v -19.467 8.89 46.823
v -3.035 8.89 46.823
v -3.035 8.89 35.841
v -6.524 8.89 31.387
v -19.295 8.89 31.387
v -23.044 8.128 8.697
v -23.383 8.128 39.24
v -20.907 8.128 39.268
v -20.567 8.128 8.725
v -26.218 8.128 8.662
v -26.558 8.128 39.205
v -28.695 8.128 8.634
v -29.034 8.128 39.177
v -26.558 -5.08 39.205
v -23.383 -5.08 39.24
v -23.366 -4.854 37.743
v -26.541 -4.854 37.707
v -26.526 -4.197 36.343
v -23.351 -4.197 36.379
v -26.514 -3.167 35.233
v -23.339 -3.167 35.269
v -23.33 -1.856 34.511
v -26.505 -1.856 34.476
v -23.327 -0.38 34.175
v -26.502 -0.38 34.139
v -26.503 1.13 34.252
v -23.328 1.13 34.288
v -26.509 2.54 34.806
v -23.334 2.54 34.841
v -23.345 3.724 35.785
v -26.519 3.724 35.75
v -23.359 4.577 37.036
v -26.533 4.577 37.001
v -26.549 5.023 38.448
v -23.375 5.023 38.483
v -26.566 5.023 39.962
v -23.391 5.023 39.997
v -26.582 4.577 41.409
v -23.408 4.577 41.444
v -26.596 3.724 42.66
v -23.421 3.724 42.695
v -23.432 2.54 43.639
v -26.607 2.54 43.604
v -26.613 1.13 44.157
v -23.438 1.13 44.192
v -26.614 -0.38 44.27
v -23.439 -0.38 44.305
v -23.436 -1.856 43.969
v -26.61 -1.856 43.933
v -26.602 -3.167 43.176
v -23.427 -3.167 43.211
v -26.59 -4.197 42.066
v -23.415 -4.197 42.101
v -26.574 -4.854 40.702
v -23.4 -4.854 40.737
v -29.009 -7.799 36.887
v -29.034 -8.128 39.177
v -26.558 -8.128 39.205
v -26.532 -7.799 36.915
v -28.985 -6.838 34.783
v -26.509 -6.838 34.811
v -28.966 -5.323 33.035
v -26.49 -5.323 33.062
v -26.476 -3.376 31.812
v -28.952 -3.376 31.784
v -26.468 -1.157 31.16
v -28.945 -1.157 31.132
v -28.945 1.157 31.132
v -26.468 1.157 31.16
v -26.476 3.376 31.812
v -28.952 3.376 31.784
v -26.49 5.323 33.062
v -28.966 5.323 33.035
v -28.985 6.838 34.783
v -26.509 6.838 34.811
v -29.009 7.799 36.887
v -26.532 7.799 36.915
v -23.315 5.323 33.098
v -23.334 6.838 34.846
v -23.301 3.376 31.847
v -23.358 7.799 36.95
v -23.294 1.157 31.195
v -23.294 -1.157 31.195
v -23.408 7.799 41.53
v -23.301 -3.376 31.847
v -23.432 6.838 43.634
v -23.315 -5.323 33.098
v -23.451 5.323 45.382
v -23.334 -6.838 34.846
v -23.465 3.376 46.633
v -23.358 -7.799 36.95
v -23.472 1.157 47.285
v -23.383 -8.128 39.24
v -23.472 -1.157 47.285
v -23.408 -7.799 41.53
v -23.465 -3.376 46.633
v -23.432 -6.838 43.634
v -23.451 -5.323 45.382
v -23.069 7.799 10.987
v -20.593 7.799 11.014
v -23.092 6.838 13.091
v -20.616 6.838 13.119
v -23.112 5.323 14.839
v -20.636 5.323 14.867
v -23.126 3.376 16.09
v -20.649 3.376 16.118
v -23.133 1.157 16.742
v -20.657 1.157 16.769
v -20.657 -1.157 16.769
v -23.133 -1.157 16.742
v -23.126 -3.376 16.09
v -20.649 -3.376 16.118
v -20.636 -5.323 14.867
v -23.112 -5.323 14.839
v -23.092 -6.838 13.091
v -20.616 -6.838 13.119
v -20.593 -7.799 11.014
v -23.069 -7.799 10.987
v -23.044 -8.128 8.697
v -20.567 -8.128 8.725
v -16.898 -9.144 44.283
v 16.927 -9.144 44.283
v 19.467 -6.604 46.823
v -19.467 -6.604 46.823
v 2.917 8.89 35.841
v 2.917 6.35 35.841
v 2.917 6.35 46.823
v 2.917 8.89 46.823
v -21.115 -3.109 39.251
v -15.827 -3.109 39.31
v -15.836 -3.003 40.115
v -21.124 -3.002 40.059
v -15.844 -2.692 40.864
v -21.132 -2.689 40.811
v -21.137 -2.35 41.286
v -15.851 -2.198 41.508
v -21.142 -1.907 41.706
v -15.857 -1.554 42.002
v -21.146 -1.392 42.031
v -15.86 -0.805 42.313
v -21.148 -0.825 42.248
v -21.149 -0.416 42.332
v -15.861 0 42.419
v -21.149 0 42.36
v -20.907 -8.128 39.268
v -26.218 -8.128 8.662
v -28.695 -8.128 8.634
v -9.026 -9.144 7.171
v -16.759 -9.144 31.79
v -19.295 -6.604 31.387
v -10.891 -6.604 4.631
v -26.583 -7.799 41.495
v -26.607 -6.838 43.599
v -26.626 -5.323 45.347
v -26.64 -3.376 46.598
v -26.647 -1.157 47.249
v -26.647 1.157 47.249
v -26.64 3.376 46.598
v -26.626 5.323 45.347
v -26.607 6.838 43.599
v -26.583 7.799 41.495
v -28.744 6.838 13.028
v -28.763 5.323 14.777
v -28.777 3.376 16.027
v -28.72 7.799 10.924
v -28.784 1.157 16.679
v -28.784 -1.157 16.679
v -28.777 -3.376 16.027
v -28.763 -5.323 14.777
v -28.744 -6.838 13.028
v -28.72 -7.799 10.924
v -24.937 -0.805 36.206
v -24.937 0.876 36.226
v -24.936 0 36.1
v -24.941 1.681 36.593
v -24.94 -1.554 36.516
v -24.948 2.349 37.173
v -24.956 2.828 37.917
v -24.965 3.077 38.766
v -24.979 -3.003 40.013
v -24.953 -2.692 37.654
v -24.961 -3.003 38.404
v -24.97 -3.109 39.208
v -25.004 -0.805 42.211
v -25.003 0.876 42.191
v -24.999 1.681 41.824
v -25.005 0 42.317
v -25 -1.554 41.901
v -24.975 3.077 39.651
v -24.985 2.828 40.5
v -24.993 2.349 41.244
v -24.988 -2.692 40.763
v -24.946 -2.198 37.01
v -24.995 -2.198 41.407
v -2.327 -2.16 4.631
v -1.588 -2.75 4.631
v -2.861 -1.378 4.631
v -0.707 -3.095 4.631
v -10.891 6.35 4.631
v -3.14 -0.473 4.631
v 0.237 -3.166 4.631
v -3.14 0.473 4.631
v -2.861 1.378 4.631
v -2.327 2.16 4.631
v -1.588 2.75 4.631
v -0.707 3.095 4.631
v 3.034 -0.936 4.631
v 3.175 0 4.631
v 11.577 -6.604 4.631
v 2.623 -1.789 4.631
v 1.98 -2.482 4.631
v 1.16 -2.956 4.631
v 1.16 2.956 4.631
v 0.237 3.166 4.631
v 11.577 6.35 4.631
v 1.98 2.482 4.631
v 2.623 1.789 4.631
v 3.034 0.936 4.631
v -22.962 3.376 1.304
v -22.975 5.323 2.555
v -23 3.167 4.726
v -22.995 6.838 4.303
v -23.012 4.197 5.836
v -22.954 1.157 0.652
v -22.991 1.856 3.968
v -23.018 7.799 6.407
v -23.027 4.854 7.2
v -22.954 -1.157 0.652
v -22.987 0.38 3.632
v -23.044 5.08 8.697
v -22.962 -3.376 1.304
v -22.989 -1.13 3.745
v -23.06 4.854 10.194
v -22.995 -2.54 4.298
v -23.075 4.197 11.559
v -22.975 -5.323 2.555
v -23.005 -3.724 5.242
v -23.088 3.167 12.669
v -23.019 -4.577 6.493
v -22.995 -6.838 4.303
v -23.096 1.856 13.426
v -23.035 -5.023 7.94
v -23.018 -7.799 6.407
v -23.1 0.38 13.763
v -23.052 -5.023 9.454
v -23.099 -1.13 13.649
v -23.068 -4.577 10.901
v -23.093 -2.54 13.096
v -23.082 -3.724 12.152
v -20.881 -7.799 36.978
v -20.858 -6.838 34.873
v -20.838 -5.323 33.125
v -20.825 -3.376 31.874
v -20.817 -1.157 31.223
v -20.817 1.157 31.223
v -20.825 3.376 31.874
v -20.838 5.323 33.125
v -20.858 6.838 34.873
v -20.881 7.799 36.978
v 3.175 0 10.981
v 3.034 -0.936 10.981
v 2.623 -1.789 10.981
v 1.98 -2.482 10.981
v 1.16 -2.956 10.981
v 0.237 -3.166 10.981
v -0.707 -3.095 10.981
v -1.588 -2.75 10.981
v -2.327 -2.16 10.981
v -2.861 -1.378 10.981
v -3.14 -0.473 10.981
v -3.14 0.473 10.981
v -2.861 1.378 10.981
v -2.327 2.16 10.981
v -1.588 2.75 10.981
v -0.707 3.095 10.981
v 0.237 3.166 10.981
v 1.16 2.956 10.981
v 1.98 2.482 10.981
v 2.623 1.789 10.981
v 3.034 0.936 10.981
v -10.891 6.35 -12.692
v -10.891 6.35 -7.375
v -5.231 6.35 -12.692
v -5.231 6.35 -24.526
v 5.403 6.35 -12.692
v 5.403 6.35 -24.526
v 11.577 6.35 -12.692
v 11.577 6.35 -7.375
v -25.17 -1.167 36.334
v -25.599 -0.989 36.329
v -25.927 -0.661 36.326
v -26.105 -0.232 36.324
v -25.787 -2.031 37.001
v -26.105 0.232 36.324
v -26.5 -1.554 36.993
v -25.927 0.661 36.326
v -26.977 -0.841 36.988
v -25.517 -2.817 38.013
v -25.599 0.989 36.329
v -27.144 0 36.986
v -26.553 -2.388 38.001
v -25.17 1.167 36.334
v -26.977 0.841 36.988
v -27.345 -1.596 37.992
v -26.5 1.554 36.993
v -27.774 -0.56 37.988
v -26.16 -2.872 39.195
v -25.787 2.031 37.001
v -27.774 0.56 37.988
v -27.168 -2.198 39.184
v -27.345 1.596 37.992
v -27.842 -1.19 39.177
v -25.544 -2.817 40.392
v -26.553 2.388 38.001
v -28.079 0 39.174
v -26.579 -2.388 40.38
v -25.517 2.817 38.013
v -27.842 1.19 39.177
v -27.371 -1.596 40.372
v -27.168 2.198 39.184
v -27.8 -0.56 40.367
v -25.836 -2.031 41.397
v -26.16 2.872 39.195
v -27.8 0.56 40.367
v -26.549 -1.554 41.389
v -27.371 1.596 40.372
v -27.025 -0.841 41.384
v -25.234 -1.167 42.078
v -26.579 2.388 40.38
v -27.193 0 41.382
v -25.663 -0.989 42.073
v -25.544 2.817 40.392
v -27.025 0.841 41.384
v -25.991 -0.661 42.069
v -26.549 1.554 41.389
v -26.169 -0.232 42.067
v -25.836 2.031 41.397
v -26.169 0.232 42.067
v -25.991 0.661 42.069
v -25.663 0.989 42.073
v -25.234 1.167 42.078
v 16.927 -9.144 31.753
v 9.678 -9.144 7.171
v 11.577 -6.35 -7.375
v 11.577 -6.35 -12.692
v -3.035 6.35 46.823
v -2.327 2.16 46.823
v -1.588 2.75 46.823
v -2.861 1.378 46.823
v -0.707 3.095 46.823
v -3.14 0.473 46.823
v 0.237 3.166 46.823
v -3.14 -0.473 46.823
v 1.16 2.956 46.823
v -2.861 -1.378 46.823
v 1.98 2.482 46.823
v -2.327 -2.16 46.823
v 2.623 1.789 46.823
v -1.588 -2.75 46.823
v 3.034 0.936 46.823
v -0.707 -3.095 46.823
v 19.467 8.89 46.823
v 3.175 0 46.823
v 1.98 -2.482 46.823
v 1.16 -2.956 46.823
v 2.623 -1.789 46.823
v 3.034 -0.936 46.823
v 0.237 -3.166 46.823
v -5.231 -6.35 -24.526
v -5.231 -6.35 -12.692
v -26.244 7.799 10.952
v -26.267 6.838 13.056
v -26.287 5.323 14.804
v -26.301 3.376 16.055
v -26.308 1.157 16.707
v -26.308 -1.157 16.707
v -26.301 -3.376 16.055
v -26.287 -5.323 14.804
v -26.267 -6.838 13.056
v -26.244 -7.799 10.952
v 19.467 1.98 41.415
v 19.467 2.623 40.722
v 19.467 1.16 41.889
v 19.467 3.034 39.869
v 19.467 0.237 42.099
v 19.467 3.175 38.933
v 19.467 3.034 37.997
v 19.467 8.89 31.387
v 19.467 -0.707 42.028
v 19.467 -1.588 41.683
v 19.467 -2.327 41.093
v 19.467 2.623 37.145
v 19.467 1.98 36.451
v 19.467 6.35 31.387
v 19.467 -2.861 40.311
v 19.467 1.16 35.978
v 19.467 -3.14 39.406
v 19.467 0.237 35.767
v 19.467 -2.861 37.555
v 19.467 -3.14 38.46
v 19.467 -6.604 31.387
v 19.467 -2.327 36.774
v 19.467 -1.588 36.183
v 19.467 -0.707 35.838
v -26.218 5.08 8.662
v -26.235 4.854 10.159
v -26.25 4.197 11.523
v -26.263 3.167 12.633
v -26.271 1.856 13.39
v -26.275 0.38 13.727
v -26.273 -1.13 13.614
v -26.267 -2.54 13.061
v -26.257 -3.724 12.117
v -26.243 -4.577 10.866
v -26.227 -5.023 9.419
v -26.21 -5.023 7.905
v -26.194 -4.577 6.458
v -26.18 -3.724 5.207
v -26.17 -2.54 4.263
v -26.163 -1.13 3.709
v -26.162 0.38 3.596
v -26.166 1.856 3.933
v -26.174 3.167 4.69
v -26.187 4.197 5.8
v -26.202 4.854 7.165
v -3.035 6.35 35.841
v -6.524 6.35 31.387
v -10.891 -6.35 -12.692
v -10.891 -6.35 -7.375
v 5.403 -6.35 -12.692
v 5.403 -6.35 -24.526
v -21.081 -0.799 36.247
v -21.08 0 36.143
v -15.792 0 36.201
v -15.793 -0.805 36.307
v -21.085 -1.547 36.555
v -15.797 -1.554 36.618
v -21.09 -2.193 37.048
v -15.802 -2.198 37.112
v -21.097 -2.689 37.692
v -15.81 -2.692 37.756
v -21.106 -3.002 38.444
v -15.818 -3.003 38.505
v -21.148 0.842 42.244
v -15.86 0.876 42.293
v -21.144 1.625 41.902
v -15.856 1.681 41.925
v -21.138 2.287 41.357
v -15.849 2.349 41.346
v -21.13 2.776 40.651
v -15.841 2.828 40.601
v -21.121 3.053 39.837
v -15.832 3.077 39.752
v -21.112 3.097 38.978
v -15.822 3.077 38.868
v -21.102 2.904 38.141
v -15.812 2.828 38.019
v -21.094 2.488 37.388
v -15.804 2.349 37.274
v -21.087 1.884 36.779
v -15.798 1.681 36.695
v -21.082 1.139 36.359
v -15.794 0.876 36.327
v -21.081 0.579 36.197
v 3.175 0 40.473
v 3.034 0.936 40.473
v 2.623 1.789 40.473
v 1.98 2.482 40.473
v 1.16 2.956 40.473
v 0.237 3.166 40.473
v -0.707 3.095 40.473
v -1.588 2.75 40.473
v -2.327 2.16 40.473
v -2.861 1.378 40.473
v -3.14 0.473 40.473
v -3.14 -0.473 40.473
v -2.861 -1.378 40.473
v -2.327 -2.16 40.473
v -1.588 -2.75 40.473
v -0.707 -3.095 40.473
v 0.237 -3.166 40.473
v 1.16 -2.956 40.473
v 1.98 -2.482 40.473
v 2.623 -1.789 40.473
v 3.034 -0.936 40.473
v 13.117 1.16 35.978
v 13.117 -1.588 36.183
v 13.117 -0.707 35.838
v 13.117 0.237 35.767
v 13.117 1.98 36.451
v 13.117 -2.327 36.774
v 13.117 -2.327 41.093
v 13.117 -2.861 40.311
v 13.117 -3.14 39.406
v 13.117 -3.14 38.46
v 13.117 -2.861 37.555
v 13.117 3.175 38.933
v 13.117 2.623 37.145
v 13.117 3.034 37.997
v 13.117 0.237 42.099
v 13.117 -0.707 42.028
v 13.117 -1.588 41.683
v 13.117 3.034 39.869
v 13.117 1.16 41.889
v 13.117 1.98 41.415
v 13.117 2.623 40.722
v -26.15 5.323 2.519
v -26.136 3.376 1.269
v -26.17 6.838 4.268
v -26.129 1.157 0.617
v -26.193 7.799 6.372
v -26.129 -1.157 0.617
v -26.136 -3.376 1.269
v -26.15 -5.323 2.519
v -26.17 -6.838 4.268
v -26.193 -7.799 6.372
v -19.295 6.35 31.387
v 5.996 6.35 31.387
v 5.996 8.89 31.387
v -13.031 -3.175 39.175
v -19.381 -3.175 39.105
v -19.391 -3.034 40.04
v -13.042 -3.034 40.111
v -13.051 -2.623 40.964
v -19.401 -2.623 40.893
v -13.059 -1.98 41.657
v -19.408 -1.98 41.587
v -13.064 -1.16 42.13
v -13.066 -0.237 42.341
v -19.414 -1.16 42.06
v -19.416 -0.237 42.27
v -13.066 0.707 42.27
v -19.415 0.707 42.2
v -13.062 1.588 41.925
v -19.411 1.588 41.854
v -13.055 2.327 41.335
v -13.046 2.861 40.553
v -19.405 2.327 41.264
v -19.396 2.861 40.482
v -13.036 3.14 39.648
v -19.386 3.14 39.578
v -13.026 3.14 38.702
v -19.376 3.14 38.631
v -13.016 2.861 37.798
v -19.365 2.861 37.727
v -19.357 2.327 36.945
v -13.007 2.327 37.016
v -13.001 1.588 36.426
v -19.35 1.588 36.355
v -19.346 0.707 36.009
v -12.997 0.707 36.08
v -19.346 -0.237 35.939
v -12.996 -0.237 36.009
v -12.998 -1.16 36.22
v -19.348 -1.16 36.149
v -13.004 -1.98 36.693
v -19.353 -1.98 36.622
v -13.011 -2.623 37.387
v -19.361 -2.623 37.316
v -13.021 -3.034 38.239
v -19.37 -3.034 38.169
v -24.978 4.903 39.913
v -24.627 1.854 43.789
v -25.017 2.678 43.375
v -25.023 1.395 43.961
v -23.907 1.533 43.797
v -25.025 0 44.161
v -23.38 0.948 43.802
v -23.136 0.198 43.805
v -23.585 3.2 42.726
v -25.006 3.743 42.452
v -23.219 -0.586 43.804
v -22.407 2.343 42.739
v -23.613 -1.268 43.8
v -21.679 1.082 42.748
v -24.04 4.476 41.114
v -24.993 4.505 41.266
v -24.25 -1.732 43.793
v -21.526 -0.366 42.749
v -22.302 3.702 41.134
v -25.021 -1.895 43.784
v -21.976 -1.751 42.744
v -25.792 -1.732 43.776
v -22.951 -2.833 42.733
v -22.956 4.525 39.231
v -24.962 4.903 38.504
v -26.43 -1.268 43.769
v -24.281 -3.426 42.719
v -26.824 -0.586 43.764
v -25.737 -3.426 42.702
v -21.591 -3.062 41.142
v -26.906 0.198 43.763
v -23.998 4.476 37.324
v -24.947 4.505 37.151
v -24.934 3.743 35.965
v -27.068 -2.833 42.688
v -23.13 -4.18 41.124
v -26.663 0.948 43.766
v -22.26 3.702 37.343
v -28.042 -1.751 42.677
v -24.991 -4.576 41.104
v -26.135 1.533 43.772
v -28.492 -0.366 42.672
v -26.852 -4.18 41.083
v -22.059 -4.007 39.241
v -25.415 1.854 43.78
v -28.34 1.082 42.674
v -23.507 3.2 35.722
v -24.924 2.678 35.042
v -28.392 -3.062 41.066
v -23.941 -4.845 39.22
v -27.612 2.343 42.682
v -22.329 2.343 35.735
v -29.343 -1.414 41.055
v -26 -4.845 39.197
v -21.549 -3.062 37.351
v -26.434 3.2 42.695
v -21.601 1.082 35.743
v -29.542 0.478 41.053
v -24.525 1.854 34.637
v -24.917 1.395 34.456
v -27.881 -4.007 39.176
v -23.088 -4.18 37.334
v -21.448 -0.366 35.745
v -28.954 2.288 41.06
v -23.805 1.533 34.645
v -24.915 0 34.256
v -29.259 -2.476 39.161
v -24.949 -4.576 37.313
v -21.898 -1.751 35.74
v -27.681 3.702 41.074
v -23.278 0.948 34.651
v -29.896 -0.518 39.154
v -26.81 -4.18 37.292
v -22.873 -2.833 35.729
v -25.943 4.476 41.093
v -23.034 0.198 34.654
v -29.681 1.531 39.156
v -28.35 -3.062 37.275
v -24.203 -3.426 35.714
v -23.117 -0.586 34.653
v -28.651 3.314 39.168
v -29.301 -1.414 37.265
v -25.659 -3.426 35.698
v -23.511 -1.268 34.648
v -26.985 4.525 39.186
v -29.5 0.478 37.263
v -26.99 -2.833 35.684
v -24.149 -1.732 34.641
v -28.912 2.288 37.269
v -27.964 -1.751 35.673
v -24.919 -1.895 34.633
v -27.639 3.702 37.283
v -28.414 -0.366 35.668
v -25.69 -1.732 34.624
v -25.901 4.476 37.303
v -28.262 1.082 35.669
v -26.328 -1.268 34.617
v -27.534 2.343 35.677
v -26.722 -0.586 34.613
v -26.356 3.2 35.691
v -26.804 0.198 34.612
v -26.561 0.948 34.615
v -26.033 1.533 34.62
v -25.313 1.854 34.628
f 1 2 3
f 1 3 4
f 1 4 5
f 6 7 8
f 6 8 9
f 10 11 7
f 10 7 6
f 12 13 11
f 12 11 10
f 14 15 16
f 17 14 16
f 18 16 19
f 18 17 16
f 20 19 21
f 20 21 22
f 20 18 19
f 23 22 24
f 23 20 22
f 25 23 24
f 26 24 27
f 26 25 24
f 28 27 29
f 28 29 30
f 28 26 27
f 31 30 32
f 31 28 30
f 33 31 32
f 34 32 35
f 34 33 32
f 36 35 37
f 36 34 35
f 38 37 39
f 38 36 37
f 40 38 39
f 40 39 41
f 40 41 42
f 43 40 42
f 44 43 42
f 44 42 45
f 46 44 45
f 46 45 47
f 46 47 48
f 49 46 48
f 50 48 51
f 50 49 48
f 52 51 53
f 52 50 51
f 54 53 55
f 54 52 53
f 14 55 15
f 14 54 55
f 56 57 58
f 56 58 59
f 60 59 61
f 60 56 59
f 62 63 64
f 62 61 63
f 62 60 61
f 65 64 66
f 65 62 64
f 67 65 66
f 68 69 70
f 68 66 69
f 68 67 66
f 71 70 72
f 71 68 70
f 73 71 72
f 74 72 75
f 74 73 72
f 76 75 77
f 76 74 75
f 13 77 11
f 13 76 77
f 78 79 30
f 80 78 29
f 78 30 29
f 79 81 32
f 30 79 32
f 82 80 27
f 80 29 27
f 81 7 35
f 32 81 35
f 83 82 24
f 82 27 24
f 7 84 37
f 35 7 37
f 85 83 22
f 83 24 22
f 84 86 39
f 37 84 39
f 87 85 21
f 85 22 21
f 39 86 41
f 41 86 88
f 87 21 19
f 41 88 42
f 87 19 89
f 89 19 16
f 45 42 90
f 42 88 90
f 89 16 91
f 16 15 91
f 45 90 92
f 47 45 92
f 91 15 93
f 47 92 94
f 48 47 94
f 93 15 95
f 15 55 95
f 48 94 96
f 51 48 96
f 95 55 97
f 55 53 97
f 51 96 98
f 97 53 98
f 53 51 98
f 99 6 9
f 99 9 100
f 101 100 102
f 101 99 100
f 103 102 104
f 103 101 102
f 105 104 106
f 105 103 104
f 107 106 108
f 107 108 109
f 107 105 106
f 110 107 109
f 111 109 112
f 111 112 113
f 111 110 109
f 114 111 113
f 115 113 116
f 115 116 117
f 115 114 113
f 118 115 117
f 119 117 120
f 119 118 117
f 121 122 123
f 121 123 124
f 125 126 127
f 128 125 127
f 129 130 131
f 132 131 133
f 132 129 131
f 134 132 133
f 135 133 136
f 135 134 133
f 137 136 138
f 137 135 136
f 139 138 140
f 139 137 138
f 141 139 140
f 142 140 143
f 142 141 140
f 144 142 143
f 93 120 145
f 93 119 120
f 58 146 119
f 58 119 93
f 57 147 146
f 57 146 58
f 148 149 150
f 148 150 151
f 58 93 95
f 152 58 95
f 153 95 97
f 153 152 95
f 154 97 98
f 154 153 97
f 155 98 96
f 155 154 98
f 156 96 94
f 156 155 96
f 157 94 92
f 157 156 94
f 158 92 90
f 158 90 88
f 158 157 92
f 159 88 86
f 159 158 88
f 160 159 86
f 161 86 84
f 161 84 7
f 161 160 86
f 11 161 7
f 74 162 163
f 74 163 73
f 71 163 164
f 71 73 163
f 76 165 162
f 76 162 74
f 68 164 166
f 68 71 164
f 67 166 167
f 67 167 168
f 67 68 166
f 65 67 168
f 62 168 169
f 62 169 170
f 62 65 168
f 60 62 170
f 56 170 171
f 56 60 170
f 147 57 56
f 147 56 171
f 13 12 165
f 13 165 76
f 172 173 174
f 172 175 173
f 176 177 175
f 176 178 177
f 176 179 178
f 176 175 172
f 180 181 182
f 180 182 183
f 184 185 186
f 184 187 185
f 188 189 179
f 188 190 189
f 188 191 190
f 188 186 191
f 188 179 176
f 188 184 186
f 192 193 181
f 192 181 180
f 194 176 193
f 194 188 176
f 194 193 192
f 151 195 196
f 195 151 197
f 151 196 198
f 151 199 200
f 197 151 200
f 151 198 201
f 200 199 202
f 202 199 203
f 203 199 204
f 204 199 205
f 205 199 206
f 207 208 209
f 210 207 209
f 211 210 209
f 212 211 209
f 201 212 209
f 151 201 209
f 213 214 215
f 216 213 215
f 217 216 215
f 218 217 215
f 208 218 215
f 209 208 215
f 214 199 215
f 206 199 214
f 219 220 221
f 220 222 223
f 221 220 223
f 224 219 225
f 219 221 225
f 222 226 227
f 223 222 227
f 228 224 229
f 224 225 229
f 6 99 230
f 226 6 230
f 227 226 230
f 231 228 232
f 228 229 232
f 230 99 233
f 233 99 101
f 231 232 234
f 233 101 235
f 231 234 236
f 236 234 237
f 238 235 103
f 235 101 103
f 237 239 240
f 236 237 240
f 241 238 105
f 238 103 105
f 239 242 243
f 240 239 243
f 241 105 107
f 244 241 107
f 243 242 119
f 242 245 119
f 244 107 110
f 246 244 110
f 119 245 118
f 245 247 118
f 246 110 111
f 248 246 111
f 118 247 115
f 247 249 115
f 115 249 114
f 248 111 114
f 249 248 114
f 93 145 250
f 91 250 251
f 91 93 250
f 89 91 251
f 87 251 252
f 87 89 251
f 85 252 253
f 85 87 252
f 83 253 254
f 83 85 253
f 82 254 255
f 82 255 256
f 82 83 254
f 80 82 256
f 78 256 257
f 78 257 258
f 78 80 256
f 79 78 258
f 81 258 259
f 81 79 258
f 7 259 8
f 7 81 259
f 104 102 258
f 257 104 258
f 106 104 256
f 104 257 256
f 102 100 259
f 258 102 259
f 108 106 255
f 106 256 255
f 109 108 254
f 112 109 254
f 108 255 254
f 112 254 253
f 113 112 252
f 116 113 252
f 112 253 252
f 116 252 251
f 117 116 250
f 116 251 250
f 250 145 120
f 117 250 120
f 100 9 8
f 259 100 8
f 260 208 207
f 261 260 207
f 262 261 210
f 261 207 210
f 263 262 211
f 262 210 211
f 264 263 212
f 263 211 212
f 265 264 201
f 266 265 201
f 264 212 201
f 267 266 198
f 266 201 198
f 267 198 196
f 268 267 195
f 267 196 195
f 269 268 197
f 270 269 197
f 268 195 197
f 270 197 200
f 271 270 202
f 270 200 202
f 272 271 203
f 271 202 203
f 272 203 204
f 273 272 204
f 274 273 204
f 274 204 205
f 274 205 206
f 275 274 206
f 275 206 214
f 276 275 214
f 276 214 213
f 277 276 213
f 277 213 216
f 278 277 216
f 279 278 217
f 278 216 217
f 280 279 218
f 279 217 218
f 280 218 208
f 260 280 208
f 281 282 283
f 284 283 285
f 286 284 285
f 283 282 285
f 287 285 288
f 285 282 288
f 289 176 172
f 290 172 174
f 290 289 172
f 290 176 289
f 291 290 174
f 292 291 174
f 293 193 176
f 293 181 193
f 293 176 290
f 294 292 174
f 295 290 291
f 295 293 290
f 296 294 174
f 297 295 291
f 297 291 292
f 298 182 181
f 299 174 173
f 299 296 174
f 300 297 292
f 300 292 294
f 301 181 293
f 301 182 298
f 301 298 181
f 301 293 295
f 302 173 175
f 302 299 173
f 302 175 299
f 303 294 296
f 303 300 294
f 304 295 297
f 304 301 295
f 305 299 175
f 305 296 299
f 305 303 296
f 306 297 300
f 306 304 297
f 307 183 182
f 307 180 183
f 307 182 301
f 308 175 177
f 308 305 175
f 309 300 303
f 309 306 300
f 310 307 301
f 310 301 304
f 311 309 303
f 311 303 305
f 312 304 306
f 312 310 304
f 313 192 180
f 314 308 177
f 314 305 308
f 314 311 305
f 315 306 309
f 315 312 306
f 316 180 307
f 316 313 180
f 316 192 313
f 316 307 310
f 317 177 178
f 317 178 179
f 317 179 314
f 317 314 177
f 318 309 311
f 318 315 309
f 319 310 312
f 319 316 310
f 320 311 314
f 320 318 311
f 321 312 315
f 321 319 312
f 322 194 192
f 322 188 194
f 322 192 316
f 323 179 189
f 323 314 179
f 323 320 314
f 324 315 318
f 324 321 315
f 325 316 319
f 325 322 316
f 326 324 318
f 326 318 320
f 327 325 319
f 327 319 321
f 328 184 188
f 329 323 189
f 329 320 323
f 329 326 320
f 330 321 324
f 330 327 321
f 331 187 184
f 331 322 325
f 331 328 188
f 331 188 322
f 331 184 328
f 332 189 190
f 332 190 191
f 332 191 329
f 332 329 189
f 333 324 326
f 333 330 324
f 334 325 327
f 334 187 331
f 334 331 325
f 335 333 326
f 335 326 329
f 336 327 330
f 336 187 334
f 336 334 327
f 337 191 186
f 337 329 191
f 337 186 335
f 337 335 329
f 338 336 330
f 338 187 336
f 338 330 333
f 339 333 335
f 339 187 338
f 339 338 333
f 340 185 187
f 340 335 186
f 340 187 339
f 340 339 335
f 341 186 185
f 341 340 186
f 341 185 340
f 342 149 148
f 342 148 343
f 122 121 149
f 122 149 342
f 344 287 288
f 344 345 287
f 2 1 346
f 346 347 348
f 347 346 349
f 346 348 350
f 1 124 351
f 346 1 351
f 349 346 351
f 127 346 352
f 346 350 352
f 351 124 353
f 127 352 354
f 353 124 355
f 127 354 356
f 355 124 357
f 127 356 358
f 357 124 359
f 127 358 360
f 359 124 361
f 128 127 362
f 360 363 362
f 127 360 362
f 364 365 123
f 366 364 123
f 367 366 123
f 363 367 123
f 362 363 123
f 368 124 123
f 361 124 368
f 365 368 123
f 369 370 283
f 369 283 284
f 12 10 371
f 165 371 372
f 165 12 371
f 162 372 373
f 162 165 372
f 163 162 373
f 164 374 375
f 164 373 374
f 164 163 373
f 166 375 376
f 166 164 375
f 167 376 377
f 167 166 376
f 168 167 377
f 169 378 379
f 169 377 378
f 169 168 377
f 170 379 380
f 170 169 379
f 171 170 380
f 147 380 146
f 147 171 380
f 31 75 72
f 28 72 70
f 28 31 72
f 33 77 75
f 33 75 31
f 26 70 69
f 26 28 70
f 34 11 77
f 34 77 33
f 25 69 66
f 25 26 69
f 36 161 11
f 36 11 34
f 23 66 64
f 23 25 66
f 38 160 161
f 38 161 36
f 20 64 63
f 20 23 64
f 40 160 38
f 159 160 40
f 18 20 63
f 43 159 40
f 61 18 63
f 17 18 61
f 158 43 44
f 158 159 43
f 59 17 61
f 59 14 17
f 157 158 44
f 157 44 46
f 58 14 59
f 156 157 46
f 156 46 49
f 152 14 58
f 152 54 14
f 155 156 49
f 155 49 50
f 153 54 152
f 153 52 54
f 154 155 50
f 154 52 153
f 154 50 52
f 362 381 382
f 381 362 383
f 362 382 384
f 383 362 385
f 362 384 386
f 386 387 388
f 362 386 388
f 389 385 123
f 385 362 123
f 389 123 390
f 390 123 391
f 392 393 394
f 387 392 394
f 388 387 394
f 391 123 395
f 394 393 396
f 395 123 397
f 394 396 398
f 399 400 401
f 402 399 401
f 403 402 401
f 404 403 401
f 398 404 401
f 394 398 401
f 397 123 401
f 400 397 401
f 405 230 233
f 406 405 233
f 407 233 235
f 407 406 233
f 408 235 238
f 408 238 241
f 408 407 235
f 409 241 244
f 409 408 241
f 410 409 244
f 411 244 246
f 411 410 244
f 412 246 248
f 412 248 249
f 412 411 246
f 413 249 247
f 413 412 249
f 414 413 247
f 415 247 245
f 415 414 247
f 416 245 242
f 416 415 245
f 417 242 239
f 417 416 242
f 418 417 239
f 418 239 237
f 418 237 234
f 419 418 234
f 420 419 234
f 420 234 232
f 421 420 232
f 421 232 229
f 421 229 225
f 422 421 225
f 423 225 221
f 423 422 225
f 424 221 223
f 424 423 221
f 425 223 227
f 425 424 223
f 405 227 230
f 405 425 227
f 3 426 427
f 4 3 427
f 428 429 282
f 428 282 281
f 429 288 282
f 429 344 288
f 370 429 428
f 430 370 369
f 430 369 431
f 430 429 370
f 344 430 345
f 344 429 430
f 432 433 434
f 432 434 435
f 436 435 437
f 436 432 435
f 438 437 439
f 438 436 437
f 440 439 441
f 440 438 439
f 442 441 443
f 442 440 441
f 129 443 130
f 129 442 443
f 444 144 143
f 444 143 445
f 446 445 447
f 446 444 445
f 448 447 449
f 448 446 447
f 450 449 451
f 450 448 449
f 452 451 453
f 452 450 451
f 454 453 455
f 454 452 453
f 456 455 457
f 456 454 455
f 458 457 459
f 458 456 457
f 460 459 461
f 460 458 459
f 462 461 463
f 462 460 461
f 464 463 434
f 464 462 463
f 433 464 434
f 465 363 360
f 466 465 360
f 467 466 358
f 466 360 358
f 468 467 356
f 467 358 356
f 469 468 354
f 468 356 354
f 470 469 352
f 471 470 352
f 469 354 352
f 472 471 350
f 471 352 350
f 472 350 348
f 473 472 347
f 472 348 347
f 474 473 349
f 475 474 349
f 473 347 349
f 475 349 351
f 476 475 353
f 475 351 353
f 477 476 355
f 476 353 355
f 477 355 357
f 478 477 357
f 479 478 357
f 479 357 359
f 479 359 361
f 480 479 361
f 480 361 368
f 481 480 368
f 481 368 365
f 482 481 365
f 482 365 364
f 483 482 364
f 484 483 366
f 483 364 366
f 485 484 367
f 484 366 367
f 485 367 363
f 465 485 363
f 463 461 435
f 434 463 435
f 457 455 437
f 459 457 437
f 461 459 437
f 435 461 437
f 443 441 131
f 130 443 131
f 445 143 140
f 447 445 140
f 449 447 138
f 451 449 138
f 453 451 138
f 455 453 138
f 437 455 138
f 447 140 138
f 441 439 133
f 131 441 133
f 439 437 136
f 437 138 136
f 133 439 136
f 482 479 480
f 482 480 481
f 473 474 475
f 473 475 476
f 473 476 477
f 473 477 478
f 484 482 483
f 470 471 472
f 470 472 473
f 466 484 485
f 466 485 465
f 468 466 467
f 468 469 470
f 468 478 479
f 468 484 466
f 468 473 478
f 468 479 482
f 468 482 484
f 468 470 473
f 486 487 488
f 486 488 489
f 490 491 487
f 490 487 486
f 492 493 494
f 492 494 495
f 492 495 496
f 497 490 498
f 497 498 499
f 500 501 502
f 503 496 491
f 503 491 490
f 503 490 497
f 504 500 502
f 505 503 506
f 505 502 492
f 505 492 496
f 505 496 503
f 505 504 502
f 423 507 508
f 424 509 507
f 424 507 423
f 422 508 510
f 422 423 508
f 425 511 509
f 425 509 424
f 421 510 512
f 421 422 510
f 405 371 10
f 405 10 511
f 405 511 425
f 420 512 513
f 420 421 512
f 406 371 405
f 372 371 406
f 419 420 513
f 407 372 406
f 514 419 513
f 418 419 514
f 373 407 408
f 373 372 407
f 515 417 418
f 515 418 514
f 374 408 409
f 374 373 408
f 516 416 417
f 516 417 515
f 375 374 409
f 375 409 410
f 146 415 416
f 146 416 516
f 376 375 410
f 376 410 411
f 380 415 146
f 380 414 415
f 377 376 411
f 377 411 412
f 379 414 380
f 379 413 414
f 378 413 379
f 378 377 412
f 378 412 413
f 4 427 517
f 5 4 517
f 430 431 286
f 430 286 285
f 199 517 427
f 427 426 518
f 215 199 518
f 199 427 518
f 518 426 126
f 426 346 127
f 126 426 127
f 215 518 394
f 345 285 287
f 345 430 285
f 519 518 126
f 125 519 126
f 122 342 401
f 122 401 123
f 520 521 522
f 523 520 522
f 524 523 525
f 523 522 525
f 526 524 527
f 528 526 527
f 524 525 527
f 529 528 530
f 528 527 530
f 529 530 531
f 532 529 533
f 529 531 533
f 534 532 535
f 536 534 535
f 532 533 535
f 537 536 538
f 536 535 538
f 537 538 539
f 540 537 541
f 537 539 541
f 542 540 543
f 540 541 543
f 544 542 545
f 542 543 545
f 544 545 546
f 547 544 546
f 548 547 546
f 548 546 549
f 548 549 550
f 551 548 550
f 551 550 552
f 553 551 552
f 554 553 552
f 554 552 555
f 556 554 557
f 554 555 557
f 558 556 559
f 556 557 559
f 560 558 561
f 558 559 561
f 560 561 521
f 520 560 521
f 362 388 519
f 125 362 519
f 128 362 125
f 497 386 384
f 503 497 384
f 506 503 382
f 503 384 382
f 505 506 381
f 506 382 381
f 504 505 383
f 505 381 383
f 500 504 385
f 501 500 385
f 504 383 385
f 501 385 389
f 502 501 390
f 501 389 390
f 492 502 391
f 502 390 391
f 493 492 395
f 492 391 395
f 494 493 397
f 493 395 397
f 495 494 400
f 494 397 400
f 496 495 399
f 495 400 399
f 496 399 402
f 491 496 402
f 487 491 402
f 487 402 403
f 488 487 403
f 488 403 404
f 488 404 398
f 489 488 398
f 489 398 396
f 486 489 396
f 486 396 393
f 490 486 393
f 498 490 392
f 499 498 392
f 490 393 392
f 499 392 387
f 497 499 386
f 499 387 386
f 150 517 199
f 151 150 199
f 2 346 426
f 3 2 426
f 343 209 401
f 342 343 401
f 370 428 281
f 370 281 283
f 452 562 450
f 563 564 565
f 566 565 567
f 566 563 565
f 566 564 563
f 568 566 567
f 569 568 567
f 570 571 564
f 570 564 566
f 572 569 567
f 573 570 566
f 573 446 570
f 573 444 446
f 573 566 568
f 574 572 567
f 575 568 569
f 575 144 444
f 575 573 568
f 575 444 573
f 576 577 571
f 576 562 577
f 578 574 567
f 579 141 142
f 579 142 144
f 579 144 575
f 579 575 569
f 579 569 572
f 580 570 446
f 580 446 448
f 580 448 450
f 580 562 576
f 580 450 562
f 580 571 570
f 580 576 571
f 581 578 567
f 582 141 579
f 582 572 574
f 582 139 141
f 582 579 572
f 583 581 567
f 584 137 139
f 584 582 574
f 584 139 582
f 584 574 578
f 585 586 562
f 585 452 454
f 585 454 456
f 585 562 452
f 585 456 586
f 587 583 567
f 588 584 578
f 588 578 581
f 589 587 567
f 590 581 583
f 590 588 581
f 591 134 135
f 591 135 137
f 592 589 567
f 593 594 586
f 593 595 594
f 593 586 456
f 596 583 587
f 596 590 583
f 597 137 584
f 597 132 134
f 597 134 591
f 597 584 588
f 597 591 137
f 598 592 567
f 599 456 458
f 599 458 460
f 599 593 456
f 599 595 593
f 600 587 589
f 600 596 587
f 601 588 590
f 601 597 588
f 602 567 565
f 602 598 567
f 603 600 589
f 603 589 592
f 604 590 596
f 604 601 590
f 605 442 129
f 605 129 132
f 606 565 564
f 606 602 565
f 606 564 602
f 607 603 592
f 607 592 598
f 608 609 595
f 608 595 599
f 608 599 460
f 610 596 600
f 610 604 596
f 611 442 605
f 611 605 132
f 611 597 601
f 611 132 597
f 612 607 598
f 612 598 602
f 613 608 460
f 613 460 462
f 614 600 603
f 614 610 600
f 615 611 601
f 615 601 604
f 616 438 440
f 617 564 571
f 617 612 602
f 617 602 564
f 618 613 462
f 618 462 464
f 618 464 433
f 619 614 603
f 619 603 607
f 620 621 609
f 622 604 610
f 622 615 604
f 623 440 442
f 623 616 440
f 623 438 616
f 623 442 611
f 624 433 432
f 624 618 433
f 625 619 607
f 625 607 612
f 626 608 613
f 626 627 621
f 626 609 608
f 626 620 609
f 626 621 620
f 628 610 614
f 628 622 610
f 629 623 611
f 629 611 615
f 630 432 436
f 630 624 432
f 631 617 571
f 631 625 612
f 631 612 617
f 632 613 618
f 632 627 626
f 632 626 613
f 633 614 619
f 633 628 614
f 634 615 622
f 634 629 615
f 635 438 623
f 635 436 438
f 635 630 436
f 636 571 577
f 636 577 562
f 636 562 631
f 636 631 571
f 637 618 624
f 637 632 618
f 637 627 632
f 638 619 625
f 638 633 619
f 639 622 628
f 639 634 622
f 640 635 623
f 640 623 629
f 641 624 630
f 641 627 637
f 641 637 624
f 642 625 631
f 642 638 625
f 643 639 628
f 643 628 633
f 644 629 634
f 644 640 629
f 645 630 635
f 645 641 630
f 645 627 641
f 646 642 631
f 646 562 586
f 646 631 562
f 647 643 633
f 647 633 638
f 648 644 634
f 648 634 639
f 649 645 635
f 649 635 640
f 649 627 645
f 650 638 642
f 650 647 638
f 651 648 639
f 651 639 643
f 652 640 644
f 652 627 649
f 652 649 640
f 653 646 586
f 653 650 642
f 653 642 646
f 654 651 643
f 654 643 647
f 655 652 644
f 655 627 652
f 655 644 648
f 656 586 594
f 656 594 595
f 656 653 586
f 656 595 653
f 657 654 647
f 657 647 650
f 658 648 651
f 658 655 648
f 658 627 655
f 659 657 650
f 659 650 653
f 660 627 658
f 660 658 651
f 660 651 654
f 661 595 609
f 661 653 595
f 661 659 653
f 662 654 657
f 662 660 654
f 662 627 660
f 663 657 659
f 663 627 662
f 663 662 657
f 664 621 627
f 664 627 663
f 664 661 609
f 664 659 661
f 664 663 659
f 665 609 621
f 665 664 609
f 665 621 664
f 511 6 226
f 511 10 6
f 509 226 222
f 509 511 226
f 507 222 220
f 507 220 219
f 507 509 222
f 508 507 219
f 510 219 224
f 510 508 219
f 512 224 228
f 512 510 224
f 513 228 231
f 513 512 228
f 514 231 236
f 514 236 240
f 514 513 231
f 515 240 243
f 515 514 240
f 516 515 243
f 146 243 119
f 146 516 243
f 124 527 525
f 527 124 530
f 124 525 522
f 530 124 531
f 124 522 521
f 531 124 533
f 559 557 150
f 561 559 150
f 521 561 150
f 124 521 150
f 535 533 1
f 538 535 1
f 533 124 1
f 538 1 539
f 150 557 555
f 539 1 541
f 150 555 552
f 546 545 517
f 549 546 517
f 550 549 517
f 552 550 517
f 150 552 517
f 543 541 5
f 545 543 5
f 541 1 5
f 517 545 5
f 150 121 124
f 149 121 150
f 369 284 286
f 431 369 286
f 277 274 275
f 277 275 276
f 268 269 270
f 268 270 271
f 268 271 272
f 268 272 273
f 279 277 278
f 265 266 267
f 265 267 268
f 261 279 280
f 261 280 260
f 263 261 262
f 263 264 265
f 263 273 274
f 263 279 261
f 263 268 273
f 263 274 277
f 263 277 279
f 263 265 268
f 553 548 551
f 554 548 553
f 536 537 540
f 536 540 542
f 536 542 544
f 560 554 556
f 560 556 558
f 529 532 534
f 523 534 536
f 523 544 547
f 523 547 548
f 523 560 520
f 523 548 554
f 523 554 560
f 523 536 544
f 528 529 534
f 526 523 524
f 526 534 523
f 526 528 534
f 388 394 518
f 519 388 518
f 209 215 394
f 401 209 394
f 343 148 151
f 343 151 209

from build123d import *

# Parameters (mm, degrees)
F1_DEPTH  = 6.35
F2_R      = 3.175
F3_DEPTH  = 6.35
F4_R      = 3.175
F5_DEPTH  = 6.35
F6_R      = 3.175
F7_DEPTH  = 6.35
F8_R      = 3.175
F9_DEPTH  = 6.35
F11_DEPTH = 2.794
F12_SIZE  = 2.54
F14_DEPTH = 2.54
F17_DEPTH = 1.5875
F18_DEPTH = 4.064
F21_DEPTH = 9.144


with BuildPart() as f1:
    # F0 (on Front) → F1 (new body, symmetric)
    with BuildSketch(Plane.XZ):
        Polygon((19.4665305316, 46.8225739896), (-19.4665268064, 46.8225739896), (-19.2950163037, 31.3865616918), (-10.89096535, 4.6308040619), (11.5770100861, 4.6308040619), (19.4665305316, 31.3865616918), align=None)
    extrude(amount=F1_DEPTH, both=True)

    # F2 (on face) → F3 (cut)
    with BuildSketch(Plane(origin=(-18.9439395066, 0, -0.2104873024), x_dir=(0, -1, 0), z_dir=(-0.9999382779, 0, -0.011110377))):
        with Locations((0, 39.3174812198)):
            Circle(F2_R)
    extrude(amount=-F3_DEPTH, mode=Mode.SUBTRACT)

    # F4 (on face) → F5 (cut)
    with BuildSketch(Plane.YZ.offset(19.4665305316)):
        with Locations((0, 38.933057338)):
            Circle(F4_R)
    extrude(amount=-F5_DEPTH, mode=Mode.SUBTRACT)

    # F6 (on face) → F7 (cut)
    with BuildSketch(Plane.XY.offset(46.8225739896)):
        Circle(F6_R)
    extrude(amount=-F7_DEPTH, mode=Mode.SUBTRACT)

    # F8 (on face) → F9 (cut)
    with BuildSketch(Plane(origin=(0, 0, 4.6308040619), x_dir=(1, 0, 0), z_dir=(0, 0, -1))):
        Circle(F8_R)
    extrude(amount=-F9_DEPTH, mode=Mode.SUBTRACT)

    # F10 (on face) → F11 (join)
    with BuildSketch(Plane.XZ.offset(6.35)):
        Polygon((19.4665305316, 31.3865616918), (19.4665305316, 46.8225739896), (-19.4665268064, 46.8225739896), (-19.2950163037, 31.3865616918), (-10.89096535, 4.6308040619), (11.5770100861, 4.6308040619), align=None)
    extrude(amount=F11_DEPTH)

    # F12
    f12_edges = [f1.edges().sort_by_distance(p)[0] for p in [
        (-19.380772, -9.144, 39.104568),
        (19.466531, -9.144, 39.104568),
        (2e-06, -9.144, 46.822574),
        (0.343022, -9.144, 4.630804),
        (-15.092991, -9.144, 18.008683),
        (15.52177, -9.144, 18.008683),
    ]]
    chamfer(f12_edges, length=F12_SIZE)

    # F13 (on face) → F14 (join)
    with BuildSketch(Plane(origin=(0, 6.35, 0), x_dir=(-1, 0, 0), z_dir=(0, 1, 0))):
        Polygon((-19.4665305316, 46.8225739896), (-19.4665305316, 31.3865616918), (-5.9960167855, 31.3865616918), (-2.9173761141, 35.8410552144), (-2.9173761141, 46.8225739896), align=None)
        Polygon((19.4665268064, 46.8225739896), (3.034662921, 46.8225739896), (3.034662921, 35.8410552144), (6.523788441, 31.3865616918), (19.2950163037, 31.3865616918), align=None)
    extrude(amount=F14_DEPTH)


with BuildPart() as f1b:
    # F0 (on Front) → F1, piece 2 (new body, symmetric)
    with BuildSketch(Plane.XZ):
        Polygon((11.5770100861, -7.3749837466), (-10.89096535, -7.3749837466), (-10.89096535, -12.6918321475), (-5.2310945466, -12.6918321475), (-5.2310945466, -24.526109919), (5.402605515, -24.526109919), (5.402605515, -12.6918321475), (11.5770100861, -12.6918321475), align=None)
    extrude(amount=F1_DEPTH, both=True)


with BuildPart() as f17:
    # F16 (on offset) → F17 (new body, symmetric)
    with BuildSketch(Plane(origin=(-24.5315946033, 0, -0.2725720893), x_dir=(0, -1, 0), z_dir=(-0.9999382779, 0, -0.011110377))):
        with BuildLine():
            Line((5.08, 39.497371763), (8.128, 39.497371763))
            ThreePointArc((8.128, 39.497371763), (0, 47.625371763), (-8.128, 39.497371763))
            Line((-8.128, 39.497371763), (-5.08, 39.497371763))
            ThreePointArc((-5.08, 39.497371763), (0, 44.577371763), (5.08, 39.497371763))
        make_face()
        with BuildLine():
            ThreePointArc((-8.128, 39.497371763), (0, 31.369371763), (8.128, 39.497371763))
            Line((8.128, 39.497371763), (5.08, 39.497371763))
            ThreePointArc((5.08, 39.497371763), (0, 34.417371763), (-5.08, 39.497371763))
            Line((-5.08, 39.497371763), (-8.128, 39.497371763))
        make_face()
    extrude(amount=F17_DEPTH, both=True)



with BuildPart() as f17b:
    # F16 (on offset) → F17, piece 2 (new body, symmetric)
    with BuildSketch(Plane(origin=(-24.5315946033, 0, -0.2725720893), x_dir=(0, -1, 0), z_dir=(-0.9999382779, 0, -0.011110377))):
        with BuildLine():
            ThreePointArc((-8.128, 8.9525301009), (0, 0.8245301009), (8.128, 8.9525301009))
            Line((8.128, 8.9525301009), (5.08, 8.9525301009))
            ThreePointArc((5.08, 8.9525301009), (0, 3.8725301009), (-5.08, 8.9525301009))
            Line((-5.08, 8.9525301009), (-8.128, 8.9525301009))
        make_face()
        with BuildLine():
            Line((5.08, 8.9525301009), (8.128, 8.9525301009))
            ThreePointArc((8.128, 8.9525301009), (0, 17.0805301009), (-8.128, 8.9525301009))
            Line((-8.128, 8.9525301009), (-5.08, 8.9525301009))
            ThreePointArc((-5.08, 8.9525301009), (0, 14.0325301009), (5.08, 8.9525301009))
        make_face()
    extrude(amount=F17_DEPTH, both=True)


with BuildPart() as f17_1:
    add(f17.part)

    add(f17b.part)  # F18 merges F17b
    # F16 (on offset) → F18 (join, symmetric)
    with BuildSketch(Plane(origin=(-24.5315946033, 0, -0.2725720893), x_dir=(0, -1, 0), z_dir=(-0.9999382779, 0, -0.011110377))):
        with BuildLine():
            Line((8.128, 8.9525301009), (8.128, 39.497371763))
            ThreePointArc((8.128, 39.497371763), (0, 31.369371763), (-8.128, 39.497371763))
            Line((-8.128, 39.497371763), (-8.128, 8.9525301009))
            ThreePointArc((-8.128, 8.9525301009), (0, 17.0805301009), (8.128, 8.9525301009))
        make_face()
    extrude(amount=F18_DEPTH, both=True)


with BuildPart() as f20:
    # F19 (on offset) → F20 (revolve)
    with BuildSketch(Plane(origin=(-24.5315946033, 0, -0.2725720893), x_dir=(0, -1, 0), z_dir=(-0.9999382779, 0, -0.011110377))):
        with BuildLine():
            Line((0, 42.5922383981), (0, 44.4364689796))
            ThreePointArc((0, 44.4364689796), (-4.953, 39.4834689796), (0, 34.5304689796))
            Line((0, 34.5304689796), (0, 36.3746995611))
            ThreePointArc((0, 36.3746995611), (-3.1087694185, 39.4834689796), (0, 42.5922383981))
        make_face()
    revolve(axis=Axis((-24.9702708307, 0, 39.208459886), (0.011110377, 0, -0.9999382779)))

    # F19 (on offset) → F21 (join)
    with BuildSketch(Plane(origin=(-24.5315946033, 0, -0.2725720893), x_dir=(0, -1, 0), z_dir=(-0.9999382779, 0, -0.011110377))):
        with BuildLine():
            ThreePointArc((3.1087694185, 39.4834689796), (2.1982319369, 41.6817009165), (0, 42.5922383981))
            Line((0, 42.5922383981), (0, 36.3746995611))
            ThreePointArc((0, 36.3746995611), (2.1982319369, 37.2852370427), (3.1087694185, 39.4834689796))
        make_face()
        with BuildLine():
            Line((0, 36.3746995611), (0, 42.5922383981))
            ThreePointArc((0, 42.5922383981), (-3.1087694185, 39.4834689796), (0, 36.3746995611))
        make_face()
    extrude(amount=-F21_DEPTH)


solid = Compound([f1.part, f1b.part, f17_1.part, f20.part])
